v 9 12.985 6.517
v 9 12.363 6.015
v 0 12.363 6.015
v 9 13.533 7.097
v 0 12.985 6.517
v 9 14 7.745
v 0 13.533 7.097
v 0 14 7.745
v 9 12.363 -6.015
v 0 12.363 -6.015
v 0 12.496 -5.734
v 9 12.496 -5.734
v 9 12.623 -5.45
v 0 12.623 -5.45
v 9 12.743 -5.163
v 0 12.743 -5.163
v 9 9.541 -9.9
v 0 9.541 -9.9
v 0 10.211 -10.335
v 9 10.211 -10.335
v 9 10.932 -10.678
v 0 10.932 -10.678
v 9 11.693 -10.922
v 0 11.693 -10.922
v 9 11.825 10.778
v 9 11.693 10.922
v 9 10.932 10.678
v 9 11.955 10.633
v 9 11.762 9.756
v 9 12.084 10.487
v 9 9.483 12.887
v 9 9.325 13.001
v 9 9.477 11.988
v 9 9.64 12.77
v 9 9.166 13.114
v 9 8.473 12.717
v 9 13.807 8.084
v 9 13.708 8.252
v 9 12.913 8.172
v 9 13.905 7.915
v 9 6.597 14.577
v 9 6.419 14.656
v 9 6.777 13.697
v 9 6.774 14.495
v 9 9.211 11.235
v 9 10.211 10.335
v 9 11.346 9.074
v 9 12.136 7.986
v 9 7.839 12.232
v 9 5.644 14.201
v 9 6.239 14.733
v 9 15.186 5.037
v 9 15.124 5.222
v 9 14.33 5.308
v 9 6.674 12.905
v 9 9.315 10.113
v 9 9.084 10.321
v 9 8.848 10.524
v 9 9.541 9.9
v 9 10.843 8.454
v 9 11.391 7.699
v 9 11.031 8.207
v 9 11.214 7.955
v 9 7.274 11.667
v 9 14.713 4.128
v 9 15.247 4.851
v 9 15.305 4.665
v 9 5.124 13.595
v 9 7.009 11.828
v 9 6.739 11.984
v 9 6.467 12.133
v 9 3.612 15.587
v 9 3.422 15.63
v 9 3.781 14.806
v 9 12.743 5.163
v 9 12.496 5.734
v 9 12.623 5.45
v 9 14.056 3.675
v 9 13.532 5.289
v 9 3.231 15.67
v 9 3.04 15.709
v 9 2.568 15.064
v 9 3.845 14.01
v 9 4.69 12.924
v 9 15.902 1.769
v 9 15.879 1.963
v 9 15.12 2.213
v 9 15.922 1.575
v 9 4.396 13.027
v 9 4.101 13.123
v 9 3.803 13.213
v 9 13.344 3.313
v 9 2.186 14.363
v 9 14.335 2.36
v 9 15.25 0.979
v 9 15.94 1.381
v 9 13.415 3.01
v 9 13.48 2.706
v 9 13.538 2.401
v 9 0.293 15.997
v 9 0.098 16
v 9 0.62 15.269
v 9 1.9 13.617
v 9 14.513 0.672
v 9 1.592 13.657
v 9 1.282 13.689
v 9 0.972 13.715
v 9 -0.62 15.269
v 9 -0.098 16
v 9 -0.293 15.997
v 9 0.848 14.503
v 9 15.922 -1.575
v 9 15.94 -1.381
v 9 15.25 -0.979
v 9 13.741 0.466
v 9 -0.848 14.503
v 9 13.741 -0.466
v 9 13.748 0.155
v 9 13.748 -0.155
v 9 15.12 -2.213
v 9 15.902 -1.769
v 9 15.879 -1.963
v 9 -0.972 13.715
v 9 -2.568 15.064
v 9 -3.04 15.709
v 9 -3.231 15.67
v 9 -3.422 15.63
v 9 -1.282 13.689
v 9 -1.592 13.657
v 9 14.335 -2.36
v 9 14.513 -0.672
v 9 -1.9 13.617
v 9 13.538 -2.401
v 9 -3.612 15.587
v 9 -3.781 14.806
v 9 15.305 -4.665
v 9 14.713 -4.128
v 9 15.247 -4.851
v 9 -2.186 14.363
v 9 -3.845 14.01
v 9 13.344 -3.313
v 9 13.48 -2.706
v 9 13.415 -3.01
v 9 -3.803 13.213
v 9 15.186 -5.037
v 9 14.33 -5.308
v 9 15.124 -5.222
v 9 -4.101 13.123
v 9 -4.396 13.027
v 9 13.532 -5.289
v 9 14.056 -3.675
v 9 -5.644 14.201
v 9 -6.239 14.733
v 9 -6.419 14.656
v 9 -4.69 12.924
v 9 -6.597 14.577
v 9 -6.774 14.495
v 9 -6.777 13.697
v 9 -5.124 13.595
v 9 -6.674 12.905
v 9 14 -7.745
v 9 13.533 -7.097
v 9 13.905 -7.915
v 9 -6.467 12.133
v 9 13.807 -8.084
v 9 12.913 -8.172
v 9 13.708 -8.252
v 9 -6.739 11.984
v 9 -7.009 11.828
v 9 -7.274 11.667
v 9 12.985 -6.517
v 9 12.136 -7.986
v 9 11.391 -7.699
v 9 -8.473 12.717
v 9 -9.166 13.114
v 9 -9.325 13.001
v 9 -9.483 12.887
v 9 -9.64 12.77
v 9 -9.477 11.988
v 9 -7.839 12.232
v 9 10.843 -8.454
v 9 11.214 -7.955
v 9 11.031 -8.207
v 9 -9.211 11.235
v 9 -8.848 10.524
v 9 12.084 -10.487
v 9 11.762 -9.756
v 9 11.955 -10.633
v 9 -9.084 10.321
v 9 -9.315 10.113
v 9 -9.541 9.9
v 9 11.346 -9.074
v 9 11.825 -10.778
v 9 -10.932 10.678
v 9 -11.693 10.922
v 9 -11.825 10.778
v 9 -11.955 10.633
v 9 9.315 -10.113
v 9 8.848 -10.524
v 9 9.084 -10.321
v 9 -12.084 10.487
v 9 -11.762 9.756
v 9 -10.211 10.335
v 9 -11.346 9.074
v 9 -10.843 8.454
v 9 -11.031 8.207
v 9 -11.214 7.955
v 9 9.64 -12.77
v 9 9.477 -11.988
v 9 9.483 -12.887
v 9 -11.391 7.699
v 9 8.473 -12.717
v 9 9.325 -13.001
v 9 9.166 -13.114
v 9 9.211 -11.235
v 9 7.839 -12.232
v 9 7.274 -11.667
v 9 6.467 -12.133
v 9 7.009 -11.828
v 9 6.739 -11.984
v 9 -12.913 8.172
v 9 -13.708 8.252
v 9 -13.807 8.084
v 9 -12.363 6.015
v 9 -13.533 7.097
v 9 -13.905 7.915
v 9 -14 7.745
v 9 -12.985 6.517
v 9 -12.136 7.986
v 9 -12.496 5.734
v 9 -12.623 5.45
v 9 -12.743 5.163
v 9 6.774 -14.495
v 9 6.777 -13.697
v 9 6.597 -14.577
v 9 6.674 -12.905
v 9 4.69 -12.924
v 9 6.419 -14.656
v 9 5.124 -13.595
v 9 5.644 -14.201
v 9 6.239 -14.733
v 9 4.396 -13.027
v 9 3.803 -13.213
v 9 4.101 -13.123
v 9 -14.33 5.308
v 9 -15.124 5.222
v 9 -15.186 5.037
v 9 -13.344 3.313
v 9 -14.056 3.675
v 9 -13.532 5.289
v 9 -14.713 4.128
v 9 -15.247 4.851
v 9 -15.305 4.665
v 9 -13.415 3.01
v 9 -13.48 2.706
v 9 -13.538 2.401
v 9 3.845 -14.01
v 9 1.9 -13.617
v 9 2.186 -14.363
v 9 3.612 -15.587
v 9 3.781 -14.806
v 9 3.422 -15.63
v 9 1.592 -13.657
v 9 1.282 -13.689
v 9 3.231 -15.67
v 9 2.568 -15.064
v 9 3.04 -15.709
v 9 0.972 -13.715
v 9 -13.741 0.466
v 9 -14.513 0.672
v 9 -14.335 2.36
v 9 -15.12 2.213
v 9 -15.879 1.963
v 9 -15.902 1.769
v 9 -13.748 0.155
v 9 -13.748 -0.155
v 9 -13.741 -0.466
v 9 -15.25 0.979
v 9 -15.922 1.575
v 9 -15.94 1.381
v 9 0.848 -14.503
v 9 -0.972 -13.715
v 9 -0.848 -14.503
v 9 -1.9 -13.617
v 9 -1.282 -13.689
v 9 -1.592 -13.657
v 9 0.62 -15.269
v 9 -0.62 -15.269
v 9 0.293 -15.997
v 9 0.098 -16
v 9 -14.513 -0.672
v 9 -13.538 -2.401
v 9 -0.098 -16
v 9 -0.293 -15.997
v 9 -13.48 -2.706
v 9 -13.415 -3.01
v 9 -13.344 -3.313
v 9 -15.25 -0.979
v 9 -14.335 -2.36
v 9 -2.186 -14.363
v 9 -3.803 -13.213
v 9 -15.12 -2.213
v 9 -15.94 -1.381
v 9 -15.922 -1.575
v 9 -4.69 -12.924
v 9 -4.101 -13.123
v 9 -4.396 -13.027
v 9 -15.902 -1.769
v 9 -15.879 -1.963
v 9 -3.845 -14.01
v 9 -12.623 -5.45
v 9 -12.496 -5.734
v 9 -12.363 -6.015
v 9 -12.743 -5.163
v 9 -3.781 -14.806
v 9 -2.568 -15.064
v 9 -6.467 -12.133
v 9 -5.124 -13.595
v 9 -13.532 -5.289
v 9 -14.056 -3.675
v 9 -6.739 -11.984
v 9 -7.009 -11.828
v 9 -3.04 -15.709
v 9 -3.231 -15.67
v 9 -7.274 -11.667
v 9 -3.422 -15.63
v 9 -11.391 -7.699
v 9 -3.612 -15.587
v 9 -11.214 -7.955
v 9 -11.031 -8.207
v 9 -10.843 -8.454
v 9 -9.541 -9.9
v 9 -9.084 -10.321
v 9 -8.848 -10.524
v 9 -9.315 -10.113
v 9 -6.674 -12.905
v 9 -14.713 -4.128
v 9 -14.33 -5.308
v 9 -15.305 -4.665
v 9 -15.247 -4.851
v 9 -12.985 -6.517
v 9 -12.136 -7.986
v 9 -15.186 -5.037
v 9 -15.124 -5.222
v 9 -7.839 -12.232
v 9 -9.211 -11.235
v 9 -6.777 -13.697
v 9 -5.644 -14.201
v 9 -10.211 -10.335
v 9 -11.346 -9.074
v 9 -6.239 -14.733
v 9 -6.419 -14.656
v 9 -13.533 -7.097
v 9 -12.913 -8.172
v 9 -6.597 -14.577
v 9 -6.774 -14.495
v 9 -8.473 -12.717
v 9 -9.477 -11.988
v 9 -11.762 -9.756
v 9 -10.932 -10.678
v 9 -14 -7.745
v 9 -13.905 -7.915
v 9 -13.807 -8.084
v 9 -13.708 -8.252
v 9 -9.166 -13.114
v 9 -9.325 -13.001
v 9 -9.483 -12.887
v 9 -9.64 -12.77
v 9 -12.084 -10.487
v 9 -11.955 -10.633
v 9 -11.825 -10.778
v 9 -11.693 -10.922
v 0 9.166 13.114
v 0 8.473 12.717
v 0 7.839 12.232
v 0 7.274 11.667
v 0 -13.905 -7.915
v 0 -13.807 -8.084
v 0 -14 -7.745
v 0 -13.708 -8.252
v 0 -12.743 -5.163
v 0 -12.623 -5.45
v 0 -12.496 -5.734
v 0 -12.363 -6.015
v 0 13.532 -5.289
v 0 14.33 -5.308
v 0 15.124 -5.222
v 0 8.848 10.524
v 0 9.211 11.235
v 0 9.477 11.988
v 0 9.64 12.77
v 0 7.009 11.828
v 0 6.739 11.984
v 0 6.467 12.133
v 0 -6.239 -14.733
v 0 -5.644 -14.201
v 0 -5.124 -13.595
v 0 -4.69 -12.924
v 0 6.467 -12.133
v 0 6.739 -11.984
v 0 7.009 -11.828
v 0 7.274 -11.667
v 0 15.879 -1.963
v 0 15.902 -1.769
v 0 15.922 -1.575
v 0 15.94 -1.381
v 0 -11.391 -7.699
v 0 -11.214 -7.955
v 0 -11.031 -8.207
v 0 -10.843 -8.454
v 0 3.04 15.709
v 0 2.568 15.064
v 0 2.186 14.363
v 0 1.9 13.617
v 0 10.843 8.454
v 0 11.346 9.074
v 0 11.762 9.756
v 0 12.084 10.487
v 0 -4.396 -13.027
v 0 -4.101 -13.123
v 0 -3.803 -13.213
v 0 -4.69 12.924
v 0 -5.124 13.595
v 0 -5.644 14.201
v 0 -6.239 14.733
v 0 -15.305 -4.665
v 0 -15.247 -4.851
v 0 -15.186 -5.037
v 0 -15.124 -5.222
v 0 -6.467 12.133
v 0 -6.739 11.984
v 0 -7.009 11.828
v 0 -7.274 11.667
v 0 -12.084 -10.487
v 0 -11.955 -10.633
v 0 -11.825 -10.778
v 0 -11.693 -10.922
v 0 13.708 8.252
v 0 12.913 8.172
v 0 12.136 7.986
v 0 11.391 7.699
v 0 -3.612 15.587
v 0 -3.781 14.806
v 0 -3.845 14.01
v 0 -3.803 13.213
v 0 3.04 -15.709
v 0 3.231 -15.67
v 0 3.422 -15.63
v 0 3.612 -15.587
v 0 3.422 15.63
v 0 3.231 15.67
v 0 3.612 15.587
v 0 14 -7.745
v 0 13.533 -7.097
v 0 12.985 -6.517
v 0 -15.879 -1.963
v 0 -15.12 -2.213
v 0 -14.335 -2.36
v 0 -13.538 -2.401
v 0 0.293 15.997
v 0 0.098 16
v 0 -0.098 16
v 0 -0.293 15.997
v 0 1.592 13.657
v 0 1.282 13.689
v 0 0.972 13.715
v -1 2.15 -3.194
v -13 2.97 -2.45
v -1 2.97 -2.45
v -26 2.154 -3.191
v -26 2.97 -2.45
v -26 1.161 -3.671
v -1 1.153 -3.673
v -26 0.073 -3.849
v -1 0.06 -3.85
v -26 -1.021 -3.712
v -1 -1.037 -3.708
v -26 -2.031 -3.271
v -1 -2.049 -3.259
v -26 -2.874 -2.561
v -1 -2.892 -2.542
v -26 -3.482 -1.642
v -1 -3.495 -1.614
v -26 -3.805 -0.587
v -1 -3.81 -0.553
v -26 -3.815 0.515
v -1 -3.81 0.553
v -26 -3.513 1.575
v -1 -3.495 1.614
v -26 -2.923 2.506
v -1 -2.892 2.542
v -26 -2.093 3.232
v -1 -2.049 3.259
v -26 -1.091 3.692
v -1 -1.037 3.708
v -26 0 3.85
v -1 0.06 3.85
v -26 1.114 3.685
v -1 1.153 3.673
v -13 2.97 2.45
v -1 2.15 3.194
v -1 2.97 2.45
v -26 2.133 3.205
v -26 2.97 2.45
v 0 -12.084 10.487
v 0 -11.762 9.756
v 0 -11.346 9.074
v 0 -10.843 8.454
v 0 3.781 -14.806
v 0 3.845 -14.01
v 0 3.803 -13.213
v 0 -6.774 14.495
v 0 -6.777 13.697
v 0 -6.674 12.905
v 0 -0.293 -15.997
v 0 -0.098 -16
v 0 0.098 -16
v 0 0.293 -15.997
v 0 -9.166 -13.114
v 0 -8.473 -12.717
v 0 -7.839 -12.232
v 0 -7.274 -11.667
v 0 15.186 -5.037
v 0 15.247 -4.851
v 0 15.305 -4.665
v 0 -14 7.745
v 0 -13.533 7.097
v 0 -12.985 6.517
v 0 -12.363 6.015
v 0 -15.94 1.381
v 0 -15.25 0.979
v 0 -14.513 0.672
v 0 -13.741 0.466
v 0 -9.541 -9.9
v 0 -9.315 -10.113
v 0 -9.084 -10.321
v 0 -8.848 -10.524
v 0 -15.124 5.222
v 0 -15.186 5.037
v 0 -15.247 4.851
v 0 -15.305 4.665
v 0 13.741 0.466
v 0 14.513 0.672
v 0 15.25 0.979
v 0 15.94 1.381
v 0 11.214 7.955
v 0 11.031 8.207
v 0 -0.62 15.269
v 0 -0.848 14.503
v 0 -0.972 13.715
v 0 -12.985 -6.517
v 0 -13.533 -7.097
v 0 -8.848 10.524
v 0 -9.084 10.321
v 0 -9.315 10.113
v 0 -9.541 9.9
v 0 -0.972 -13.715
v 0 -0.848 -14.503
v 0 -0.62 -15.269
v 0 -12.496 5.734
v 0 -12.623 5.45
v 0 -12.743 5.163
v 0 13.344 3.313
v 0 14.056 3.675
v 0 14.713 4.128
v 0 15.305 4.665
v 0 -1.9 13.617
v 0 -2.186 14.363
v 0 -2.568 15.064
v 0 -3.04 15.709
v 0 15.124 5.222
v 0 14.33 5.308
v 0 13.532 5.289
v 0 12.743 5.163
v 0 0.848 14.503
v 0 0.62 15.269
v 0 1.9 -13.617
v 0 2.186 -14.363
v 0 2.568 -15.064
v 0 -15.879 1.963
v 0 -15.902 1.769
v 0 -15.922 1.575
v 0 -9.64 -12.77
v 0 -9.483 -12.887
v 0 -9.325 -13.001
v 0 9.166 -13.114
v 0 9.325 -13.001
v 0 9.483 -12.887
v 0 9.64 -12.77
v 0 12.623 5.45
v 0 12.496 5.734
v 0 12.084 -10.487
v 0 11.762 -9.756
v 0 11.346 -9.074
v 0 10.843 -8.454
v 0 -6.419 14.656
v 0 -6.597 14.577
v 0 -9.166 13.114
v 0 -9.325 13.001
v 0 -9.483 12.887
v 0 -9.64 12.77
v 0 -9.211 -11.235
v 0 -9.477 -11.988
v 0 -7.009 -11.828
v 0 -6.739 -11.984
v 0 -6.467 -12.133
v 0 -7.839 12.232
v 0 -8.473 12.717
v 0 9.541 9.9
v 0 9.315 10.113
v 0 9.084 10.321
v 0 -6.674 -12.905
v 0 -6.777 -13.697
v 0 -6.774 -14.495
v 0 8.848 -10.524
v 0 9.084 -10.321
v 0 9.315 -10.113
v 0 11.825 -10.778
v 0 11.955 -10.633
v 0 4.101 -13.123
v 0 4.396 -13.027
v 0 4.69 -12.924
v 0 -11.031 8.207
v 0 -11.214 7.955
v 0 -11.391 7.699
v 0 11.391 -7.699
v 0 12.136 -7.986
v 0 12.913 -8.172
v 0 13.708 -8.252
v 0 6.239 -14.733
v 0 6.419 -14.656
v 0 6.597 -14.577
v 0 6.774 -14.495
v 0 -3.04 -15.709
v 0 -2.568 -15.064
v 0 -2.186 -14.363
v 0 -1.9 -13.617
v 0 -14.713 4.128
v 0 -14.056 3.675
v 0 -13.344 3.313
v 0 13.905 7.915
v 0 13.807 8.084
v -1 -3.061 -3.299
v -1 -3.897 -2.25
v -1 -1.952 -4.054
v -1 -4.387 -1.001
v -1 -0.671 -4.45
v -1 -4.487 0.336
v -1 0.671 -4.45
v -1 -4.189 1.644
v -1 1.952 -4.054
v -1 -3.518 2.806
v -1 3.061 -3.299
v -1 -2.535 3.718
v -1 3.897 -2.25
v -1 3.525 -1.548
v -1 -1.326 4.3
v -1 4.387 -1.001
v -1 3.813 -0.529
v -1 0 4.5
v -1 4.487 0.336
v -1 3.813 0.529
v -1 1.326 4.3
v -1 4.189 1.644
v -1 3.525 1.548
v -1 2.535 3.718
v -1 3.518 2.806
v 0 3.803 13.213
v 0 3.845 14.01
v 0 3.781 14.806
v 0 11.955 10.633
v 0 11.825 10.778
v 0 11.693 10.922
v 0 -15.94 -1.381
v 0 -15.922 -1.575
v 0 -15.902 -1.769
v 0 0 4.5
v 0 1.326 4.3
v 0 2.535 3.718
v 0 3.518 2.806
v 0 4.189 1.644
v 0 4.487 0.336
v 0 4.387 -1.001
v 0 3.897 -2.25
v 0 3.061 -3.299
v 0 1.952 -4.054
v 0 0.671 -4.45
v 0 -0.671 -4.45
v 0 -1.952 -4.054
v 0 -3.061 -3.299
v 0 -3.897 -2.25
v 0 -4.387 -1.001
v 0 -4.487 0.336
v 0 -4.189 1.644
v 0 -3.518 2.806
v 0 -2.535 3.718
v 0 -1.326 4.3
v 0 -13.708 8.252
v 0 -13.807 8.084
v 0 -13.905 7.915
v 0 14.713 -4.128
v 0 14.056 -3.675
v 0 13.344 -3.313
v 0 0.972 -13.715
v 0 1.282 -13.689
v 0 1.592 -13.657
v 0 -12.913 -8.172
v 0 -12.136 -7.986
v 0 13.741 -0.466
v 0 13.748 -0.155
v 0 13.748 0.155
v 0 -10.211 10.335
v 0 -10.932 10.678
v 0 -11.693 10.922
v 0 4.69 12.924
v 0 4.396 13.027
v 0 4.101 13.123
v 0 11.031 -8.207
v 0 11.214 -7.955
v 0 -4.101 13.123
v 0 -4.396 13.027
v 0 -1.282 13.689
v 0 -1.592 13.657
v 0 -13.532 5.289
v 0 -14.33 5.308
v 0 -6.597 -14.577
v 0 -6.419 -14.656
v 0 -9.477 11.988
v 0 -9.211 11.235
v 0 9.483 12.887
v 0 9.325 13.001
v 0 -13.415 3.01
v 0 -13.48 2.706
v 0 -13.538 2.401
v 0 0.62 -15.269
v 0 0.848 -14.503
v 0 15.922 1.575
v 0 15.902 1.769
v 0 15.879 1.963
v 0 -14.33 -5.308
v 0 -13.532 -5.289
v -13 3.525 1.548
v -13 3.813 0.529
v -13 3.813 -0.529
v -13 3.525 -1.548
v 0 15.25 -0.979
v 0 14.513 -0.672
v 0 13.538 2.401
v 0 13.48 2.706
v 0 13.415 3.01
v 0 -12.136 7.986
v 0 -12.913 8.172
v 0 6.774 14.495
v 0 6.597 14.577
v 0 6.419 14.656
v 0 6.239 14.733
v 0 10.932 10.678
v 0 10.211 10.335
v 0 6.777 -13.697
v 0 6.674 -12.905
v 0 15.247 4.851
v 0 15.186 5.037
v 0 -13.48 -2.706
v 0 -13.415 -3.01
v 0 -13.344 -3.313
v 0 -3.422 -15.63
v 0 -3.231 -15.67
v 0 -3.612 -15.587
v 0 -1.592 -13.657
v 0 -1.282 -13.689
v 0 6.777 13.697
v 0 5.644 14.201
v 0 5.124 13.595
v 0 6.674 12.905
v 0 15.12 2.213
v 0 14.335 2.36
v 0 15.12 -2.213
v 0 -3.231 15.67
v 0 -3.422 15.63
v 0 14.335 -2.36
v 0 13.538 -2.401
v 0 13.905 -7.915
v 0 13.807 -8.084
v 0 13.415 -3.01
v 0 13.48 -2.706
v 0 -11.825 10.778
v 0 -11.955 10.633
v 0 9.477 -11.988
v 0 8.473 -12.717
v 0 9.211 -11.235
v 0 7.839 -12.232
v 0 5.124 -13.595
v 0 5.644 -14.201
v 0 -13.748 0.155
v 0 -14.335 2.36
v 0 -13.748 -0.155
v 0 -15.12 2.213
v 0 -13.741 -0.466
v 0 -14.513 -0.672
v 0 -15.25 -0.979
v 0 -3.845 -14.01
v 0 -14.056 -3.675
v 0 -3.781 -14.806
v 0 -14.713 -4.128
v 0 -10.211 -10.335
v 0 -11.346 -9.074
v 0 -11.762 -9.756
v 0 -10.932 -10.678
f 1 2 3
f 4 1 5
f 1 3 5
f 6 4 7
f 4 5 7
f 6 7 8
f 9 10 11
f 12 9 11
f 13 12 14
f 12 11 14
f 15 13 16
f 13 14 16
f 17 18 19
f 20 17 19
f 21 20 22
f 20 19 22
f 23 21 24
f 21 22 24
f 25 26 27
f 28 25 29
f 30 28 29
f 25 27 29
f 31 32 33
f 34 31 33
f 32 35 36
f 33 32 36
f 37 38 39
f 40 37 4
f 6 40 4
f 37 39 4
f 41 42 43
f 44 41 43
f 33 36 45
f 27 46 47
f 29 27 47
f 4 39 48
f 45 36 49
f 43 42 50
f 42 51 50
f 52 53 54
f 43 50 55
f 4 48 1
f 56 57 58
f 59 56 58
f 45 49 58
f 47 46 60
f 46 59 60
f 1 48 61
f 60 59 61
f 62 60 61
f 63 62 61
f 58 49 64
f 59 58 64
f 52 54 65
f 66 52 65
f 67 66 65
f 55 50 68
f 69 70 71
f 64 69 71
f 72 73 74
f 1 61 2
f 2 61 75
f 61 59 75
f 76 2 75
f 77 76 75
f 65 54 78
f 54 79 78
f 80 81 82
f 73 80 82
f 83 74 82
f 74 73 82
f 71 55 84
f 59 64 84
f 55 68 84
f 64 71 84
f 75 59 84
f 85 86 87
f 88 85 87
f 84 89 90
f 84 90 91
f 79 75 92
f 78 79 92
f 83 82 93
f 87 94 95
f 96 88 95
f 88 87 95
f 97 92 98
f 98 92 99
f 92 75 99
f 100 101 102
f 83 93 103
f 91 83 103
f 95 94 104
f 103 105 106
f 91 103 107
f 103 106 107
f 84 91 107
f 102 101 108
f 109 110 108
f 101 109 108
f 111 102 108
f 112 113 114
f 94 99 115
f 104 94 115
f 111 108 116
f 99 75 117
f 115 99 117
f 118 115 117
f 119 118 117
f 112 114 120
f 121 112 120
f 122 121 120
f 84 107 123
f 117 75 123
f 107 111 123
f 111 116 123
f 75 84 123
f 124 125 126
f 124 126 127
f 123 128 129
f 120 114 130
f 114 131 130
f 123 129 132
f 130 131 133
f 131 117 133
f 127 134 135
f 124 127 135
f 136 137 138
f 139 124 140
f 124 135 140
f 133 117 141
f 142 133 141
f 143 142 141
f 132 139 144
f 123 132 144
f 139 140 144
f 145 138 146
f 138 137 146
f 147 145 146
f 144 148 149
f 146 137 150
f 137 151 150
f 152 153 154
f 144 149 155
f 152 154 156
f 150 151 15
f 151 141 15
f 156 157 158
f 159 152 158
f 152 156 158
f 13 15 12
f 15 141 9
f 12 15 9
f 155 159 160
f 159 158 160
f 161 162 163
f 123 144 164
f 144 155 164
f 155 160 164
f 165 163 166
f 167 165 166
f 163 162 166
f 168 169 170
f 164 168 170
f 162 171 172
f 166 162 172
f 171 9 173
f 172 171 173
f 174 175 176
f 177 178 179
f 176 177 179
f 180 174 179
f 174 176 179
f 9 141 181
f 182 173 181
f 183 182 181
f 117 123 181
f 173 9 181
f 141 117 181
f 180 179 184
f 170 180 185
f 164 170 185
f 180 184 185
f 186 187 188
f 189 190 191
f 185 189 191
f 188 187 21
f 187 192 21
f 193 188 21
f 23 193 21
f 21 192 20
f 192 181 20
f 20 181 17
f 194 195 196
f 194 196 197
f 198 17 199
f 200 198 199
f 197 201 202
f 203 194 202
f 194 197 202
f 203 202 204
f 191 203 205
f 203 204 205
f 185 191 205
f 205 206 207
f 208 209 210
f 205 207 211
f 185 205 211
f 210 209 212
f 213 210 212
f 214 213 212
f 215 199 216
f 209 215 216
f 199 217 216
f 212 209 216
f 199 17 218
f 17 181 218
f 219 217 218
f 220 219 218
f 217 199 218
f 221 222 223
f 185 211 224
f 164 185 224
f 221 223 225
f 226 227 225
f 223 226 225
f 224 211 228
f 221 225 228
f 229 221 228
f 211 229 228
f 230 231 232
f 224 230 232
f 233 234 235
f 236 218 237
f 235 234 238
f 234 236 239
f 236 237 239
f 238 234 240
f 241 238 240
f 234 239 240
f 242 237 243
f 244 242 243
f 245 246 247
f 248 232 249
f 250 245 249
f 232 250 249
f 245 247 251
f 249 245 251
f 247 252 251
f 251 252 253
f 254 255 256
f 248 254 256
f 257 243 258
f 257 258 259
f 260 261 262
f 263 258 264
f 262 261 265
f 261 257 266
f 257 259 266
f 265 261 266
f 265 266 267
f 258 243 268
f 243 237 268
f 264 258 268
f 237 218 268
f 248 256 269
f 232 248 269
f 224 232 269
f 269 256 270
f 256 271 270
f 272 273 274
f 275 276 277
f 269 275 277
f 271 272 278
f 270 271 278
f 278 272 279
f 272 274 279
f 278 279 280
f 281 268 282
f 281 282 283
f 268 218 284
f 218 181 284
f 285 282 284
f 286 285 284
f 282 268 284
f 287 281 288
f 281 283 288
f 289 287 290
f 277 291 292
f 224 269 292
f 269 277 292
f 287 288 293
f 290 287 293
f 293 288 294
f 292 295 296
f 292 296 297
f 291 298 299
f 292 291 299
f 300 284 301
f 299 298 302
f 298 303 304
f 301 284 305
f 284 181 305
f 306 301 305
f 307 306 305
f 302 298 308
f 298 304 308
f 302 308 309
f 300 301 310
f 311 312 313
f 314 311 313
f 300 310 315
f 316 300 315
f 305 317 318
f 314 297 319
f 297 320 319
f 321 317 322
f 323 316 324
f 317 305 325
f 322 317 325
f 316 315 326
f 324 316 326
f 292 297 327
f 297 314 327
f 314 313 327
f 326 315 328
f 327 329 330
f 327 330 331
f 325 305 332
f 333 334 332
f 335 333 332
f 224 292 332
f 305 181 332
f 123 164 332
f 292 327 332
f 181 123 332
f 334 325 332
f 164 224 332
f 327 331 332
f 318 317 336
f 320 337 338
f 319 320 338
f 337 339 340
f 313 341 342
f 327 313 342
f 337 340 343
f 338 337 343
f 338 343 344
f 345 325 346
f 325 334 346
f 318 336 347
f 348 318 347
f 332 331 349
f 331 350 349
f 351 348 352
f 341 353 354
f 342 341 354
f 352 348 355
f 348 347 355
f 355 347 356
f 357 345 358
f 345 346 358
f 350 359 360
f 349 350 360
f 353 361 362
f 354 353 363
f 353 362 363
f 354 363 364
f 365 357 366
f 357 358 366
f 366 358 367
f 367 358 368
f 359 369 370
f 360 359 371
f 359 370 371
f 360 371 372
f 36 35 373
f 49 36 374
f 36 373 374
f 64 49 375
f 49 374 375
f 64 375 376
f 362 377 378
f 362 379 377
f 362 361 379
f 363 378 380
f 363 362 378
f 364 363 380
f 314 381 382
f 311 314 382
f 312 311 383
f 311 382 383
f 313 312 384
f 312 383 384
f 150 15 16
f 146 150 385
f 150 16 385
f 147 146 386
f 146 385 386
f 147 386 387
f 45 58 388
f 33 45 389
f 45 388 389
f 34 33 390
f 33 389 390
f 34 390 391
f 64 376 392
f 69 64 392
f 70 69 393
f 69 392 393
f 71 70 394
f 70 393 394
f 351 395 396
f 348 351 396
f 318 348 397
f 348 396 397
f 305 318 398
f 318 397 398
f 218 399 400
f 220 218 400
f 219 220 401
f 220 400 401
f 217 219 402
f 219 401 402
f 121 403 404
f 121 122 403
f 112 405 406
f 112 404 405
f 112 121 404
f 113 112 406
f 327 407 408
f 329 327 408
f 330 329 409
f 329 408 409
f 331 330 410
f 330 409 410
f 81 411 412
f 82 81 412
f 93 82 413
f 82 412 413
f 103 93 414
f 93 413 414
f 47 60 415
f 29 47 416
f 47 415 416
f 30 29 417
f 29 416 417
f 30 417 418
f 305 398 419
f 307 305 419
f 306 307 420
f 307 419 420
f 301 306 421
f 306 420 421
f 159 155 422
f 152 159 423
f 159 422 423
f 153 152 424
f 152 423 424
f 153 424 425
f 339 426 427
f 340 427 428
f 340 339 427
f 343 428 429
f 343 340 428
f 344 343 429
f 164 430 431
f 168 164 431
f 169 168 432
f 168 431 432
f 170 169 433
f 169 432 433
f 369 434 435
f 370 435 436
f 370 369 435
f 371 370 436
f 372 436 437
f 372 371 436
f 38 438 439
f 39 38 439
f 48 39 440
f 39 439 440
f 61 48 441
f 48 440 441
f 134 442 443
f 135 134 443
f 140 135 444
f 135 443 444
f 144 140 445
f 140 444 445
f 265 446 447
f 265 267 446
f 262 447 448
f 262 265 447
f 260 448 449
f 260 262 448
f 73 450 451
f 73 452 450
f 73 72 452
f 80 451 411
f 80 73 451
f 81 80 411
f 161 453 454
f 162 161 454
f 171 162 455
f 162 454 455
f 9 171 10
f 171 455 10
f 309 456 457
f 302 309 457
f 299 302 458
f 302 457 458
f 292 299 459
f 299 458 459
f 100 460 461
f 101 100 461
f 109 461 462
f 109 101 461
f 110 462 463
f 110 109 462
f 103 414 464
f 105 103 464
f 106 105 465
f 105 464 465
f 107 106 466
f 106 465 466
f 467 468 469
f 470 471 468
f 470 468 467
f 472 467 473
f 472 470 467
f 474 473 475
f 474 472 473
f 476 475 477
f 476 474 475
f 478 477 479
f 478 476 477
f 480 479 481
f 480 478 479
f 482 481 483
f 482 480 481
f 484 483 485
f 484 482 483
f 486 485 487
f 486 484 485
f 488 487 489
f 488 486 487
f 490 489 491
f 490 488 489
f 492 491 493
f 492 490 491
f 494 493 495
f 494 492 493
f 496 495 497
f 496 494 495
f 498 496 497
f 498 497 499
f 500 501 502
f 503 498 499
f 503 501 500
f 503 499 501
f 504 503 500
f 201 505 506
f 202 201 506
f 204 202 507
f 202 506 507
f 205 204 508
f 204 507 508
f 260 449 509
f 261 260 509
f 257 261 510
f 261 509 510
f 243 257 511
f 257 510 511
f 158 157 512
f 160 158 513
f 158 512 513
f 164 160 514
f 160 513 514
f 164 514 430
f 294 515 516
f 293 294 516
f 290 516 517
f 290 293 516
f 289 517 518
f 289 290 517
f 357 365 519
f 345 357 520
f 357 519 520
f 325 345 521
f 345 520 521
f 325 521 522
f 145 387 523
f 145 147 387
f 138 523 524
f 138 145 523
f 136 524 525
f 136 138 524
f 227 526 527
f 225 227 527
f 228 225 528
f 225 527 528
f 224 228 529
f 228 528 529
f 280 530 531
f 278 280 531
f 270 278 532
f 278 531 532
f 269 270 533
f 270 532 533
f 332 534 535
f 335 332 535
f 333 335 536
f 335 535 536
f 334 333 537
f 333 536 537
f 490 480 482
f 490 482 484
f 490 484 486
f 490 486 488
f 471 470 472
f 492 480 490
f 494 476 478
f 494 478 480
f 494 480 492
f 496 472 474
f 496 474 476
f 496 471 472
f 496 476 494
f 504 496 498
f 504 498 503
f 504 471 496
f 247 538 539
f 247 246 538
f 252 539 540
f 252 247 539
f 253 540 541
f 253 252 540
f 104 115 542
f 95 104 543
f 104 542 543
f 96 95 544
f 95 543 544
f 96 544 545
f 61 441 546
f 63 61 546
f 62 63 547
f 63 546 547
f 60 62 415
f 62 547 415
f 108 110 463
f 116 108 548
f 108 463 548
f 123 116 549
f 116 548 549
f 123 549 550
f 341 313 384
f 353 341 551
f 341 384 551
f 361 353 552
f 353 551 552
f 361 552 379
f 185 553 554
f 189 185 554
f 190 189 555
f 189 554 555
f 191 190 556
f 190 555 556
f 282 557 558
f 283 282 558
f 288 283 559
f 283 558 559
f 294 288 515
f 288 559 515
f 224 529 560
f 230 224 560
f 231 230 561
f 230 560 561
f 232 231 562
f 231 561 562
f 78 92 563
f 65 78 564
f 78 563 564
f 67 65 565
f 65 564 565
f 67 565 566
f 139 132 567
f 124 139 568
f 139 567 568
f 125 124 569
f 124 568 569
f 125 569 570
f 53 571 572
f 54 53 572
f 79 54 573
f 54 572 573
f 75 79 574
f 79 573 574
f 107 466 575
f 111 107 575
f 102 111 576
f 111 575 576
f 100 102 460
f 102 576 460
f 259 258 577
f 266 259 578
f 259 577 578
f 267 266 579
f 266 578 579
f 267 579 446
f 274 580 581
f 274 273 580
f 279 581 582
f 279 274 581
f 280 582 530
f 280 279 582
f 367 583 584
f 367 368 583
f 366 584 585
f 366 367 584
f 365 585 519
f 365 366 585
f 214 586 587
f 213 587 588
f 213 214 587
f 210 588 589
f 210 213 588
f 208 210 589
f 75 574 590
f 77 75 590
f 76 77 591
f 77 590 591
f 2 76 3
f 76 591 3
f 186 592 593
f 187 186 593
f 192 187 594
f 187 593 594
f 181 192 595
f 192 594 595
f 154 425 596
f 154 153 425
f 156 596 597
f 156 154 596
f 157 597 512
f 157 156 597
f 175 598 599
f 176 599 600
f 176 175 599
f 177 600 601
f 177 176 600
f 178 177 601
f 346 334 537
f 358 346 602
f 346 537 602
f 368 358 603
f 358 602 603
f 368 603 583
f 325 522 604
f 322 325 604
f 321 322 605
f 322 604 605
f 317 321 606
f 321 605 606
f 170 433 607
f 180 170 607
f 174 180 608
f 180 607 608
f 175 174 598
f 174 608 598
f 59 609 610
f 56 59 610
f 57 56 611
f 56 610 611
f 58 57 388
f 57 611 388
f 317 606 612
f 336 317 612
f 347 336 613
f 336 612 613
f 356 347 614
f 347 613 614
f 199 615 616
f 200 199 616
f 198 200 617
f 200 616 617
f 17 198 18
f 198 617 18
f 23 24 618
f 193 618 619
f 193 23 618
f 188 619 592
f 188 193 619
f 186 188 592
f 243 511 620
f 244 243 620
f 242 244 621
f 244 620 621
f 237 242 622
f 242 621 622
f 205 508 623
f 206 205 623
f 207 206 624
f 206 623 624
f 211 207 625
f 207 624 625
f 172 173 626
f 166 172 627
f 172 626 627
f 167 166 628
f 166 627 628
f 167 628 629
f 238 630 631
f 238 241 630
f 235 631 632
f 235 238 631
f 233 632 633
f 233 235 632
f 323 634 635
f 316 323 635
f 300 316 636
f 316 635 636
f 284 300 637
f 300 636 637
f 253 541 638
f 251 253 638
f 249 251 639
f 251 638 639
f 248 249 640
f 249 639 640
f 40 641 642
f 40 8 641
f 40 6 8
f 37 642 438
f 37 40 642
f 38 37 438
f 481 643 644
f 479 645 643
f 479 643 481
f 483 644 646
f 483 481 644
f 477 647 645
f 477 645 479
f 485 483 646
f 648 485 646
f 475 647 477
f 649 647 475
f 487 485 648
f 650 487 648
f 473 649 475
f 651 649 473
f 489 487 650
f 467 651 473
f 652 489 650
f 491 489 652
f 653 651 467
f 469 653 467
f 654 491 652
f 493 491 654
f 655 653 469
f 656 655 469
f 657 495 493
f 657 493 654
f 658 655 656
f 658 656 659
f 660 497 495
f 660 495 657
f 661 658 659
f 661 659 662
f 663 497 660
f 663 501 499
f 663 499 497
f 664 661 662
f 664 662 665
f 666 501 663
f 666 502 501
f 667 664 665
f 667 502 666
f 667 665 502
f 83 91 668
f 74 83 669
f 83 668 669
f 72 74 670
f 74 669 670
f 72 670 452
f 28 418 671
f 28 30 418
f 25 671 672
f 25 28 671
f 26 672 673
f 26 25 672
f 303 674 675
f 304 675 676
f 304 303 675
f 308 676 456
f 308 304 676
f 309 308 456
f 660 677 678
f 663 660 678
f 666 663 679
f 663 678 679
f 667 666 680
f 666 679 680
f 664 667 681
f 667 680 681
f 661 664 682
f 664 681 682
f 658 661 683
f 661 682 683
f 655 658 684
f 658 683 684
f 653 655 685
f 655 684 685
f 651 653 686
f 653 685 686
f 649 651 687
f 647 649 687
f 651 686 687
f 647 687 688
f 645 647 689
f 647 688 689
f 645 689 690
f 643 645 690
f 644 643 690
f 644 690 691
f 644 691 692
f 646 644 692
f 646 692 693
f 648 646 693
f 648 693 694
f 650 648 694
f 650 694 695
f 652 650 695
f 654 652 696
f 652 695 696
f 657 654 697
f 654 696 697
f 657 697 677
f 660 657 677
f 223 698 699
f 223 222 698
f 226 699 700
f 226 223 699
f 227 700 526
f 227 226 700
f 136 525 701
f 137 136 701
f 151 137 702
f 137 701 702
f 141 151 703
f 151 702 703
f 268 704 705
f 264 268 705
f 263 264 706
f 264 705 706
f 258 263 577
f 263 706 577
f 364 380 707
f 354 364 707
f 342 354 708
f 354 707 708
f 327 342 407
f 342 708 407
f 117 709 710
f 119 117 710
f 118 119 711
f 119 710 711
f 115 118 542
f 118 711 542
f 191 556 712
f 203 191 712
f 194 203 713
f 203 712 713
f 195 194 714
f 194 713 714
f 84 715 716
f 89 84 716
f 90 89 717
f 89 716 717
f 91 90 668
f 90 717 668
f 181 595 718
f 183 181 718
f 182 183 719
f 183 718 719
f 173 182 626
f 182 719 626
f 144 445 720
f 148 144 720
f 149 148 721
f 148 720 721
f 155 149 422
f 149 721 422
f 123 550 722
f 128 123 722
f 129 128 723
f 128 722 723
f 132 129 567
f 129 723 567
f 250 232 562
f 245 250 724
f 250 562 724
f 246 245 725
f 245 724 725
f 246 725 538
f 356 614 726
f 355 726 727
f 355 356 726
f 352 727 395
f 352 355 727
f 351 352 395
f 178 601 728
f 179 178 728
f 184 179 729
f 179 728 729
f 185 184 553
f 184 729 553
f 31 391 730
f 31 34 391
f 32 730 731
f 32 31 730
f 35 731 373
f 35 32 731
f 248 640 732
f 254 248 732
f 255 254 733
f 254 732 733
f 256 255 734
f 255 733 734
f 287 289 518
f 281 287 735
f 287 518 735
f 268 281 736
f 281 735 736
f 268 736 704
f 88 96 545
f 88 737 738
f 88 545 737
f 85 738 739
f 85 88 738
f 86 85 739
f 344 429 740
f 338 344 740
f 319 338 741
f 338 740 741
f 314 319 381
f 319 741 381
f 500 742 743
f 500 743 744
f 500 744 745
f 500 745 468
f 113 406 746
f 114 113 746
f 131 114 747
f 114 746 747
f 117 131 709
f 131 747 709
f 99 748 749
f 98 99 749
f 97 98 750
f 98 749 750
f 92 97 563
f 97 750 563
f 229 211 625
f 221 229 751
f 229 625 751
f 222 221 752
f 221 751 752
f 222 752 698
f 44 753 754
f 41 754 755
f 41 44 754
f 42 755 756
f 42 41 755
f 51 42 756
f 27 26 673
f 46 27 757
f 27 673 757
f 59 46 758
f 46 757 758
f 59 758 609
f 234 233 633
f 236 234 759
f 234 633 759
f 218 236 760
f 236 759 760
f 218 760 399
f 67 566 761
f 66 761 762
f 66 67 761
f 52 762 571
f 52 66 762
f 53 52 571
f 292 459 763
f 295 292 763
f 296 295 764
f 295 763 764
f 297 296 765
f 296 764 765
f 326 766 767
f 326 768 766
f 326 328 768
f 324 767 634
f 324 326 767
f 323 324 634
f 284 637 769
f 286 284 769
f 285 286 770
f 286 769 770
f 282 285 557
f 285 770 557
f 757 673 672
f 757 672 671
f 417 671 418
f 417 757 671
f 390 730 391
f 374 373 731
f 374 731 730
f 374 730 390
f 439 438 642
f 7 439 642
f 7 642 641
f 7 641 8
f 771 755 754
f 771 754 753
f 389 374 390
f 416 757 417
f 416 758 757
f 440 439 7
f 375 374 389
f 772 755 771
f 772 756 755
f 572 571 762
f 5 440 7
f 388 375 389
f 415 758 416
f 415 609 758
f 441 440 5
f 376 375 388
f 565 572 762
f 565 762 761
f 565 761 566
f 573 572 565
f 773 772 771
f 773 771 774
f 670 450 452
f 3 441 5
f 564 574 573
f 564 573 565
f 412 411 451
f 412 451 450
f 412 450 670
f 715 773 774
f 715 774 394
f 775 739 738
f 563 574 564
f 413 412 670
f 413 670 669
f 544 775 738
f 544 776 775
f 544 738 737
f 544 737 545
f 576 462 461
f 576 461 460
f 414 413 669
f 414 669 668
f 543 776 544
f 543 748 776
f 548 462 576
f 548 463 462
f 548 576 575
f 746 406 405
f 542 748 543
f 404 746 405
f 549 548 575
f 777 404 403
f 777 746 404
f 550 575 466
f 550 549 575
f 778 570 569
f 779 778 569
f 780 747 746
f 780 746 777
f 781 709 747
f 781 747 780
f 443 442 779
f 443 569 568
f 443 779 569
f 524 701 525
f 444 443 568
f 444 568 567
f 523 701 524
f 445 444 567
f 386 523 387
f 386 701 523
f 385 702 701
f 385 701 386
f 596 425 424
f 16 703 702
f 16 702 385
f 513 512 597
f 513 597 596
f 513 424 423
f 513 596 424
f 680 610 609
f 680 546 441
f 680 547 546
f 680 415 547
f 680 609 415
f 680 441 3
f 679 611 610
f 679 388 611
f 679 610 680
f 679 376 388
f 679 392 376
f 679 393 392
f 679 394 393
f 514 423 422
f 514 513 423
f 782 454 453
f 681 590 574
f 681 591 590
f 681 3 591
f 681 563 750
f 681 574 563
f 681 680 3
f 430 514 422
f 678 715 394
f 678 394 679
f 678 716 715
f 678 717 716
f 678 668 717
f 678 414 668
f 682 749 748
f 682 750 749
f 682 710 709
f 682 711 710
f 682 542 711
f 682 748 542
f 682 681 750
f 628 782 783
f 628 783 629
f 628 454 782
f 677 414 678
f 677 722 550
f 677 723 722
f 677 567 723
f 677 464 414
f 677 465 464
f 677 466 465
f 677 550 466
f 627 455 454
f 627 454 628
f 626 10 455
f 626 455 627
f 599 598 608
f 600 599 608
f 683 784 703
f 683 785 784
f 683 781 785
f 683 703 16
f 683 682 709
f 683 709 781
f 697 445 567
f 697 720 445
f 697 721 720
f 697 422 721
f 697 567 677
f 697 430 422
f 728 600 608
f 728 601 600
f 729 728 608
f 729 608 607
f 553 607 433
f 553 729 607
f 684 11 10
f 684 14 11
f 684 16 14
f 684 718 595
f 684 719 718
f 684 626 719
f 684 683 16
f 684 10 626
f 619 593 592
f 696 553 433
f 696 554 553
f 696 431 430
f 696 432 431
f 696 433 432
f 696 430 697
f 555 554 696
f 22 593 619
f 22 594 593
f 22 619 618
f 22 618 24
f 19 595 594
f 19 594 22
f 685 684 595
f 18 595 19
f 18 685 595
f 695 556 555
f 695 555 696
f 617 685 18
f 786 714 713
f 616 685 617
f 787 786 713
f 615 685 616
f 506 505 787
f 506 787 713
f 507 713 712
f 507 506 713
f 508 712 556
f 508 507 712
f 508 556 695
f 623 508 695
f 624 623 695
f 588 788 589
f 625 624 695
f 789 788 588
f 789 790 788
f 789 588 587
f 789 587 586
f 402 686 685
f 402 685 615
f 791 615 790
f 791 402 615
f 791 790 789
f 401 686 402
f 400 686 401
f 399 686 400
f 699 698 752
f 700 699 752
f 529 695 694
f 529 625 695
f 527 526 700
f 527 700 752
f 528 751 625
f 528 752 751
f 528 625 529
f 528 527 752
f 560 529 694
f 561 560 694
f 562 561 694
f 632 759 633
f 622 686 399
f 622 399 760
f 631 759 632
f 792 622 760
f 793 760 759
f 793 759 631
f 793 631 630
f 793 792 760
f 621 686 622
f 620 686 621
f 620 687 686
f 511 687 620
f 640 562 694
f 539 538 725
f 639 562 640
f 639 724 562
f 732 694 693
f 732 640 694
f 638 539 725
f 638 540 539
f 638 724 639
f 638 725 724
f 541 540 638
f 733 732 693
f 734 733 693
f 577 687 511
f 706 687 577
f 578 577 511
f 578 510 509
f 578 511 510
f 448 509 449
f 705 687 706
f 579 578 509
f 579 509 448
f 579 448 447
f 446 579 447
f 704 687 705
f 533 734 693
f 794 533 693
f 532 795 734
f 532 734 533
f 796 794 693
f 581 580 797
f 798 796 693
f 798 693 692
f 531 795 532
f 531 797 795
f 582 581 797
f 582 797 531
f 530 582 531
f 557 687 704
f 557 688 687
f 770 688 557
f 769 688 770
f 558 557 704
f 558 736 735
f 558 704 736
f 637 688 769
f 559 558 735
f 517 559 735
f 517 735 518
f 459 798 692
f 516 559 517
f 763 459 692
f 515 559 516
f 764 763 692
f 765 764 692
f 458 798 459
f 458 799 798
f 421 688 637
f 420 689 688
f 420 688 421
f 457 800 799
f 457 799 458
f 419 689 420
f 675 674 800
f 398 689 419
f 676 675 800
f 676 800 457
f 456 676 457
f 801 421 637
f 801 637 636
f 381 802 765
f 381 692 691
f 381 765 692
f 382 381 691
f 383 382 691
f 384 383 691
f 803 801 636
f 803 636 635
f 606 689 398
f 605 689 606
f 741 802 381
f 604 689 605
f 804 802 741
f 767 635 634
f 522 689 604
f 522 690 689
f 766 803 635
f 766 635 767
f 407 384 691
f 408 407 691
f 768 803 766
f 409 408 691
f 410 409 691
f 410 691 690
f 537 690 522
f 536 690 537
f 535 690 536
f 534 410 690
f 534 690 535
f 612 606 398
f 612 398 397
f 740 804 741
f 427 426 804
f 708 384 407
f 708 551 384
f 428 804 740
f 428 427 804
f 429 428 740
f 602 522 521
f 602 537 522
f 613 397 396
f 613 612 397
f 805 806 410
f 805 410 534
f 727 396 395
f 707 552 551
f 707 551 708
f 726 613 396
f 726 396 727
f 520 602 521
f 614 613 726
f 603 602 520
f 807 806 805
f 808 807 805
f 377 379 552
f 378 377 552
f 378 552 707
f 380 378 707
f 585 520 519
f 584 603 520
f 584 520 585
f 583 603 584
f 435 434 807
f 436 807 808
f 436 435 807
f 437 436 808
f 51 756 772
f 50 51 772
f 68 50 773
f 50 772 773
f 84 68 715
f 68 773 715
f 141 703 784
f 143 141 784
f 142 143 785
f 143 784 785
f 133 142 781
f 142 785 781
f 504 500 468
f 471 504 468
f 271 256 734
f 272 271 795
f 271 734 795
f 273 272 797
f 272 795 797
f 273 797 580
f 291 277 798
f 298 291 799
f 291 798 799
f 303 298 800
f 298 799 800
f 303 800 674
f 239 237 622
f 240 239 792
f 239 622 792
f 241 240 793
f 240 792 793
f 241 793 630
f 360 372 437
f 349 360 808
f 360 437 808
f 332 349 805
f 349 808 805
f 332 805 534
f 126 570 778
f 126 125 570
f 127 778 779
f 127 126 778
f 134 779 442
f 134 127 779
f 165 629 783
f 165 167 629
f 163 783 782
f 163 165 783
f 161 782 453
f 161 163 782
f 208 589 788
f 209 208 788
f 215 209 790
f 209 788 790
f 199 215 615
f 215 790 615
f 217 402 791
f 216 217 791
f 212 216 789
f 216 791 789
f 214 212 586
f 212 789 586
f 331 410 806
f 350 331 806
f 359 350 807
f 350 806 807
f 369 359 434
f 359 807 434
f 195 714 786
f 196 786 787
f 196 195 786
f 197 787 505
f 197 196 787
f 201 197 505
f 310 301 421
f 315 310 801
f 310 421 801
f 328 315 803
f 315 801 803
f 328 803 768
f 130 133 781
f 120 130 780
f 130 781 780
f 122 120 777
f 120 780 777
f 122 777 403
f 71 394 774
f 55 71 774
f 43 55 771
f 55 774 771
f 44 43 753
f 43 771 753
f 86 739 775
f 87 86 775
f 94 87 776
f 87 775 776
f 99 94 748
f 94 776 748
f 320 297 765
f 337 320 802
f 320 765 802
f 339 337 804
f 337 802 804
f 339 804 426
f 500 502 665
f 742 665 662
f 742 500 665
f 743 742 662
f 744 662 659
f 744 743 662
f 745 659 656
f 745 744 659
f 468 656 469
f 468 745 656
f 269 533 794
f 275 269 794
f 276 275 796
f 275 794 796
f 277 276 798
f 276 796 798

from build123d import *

# Parameters (mm, degrees)
BASPROSKE_W              = 9
BASPROSKE_H              = 16
TOOTHCUT_DEPTH           = 25.351591324
TEETHCUTS_COUNT          = 30
TEETHCUTS_ANGLE          = 348
BORSKE_R                 = 4
BORE_DEPTH               = 50.0000508
BOSS_EXTRUDE3_DEPTH      = 26
BOSS_EXTRUDE3_DEPTH_BACK = 9
BOSS_EXTRUDE4_DEPTH      = 13
BOSS_EXTRUDE4_DEPTH_BACK = 9
BOSS_EXTRUDE5_DEPTH      = 1
BOSS_EXTRUDE5_DEPTH_BACK = 9
SKETCH2_6_R              = 4.5


with BuildPart() as part:
    # BasProSke → Base-Revolve (revolve)
    with BuildSketch(Plane(origin=(0, 0, 0), x_dir=(1, 0, 0), z_dir=(0, 1, 0))):
        with Locations((4.5, 8)):
            Rectangle(BASPROSKE_W, BASPROSKE_H)
    revolve(axis=Axis((-10, 0, 0), (1, 0, 0)))

    # TooCutSke → ToothCut (cut, through all)
    with BuildSketch(Plane(origin=(0, 0, 0), x_dir=(0, 0, -1), z_dir=(1, 0, 0))):
        with BuildLine():
            ThreePointArc((0.466400716, 13.741086979), (0, 13.749), (-0.466400716, 13.741086979))
            ThreePointArc((-0.466400716, 13.741086979), (-0.819142092, 14.899954875), (-1.3974676, 15.964351834))
            ThreePointArc((-1.3974676, 15.964351834), (0, 16.0254), (1.3974676, 15.964351834))
            ThreePointArc((1.3974676, 15.964351834), (0.819142092, 14.899954875), (0.466400716, 13.741086979))
        make_face()
    toothcut = extrude(amount=TOOTHCUT_DEPTH, mode=Mode.SUBTRACT)

    # TeethCuts: ToothCut ×30 about axis
    teethcuts_axis = Axis((-10, 0, 0), (1, 0, 0))
    for i in range(1, TEETHCUTS_COUNT):
        add(toothcut.rotate(teethcuts_axis, i * TEETHCUTS_ANGLE / (TEETHCUTS_COUNT - 1)), mode=Mode.SUBTRACT)

    # BorSke → Bore (cut, symmetric)
    with BuildSketch(Plane(origin=(0, 0, 0), x_dir=(0, 0, -1), z_dir=(1, 0, 0))):
        Circle(BORSKE_R)
    extrude(amount=BORE_DEPTH, both=True, mode=Mode.SUBTRACT)



with BuildPart() as body_2:
    # Sketch2 → Boss-Extrude3 (new, two sides: drawn at the far end of the back side and taken through both)
    with BuildSketch(Plane.ZY.offset(-BOSS_EXTRUDE3_DEPTH_BACK)):
        with BuildLine():
            Line((2.45, 2.969848481), (-2.45, 2.969848481))
            ThreePointArc((-2.45, 2.969848481), (-1.641645516, -3.48245603), (3.85, 0))
            ThreePointArc((3.85, 0), (3.48245603, 1.641645516), (2.45, 2.969848481))
        make_face()
    extrude(amount=BOSS_EXTRUDE3_DEPTH + BOSS_EXTRUDE3_DEPTH_BACK)

    # Sketch2<5> → Boss-Extrude4 (add, two sides: drawn at the far end of the back side and taken through both)
    with BuildSketch(Plane.ZY.offset(-BOSS_EXTRUDE4_DEPTH_BACK)):
        with BuildLine():
            ThreePointArc((2.45, 2.969848481), (0, 3.85), (-2.45, 2.969848481))
            Line((-2.45, 2.969848481), (2.45, 2.969848481))
        make_face()
    extrude(amount=BOSS_EXTRUDE4_DEPTH + BOSS_EXTRUDE4_DEPTH_BACK)


with BuildPart() as part_1:
    add(part.part)

    add(body_2.part)  # Boss-Extrude5 merges body 2
    # Sketch2<6> → Boss-Extrude5 (add, two sides: drawn at the far end of the back side and taken through both)
    with BuildSketch(Plane.ZY.offset(-BOSS_EXTRUDE5_DEPTH_BACK)):
        Circle(SKETCH2_6_R)
        with BuildLine():
            ThreePointArc((3.85, 0), (-1.641645516, -3.48245603), (-2.45, 2.969848481))
            ThreePointArc((-2.45, 2.969848481), (0, 3.85), (2.45, 2.969848481))
            ThreePointArc((2.45, 2.969848481), (3.48245603, 1.641645516), (3.85, 0))
        make_face(mode=Mode.SUBTRACT)
    extrude(amount=BOSS_EXTRUDE5_DEPTH + BOSS_EXTRUDE5_DEPTH_BACK)


solid = part_1.part
